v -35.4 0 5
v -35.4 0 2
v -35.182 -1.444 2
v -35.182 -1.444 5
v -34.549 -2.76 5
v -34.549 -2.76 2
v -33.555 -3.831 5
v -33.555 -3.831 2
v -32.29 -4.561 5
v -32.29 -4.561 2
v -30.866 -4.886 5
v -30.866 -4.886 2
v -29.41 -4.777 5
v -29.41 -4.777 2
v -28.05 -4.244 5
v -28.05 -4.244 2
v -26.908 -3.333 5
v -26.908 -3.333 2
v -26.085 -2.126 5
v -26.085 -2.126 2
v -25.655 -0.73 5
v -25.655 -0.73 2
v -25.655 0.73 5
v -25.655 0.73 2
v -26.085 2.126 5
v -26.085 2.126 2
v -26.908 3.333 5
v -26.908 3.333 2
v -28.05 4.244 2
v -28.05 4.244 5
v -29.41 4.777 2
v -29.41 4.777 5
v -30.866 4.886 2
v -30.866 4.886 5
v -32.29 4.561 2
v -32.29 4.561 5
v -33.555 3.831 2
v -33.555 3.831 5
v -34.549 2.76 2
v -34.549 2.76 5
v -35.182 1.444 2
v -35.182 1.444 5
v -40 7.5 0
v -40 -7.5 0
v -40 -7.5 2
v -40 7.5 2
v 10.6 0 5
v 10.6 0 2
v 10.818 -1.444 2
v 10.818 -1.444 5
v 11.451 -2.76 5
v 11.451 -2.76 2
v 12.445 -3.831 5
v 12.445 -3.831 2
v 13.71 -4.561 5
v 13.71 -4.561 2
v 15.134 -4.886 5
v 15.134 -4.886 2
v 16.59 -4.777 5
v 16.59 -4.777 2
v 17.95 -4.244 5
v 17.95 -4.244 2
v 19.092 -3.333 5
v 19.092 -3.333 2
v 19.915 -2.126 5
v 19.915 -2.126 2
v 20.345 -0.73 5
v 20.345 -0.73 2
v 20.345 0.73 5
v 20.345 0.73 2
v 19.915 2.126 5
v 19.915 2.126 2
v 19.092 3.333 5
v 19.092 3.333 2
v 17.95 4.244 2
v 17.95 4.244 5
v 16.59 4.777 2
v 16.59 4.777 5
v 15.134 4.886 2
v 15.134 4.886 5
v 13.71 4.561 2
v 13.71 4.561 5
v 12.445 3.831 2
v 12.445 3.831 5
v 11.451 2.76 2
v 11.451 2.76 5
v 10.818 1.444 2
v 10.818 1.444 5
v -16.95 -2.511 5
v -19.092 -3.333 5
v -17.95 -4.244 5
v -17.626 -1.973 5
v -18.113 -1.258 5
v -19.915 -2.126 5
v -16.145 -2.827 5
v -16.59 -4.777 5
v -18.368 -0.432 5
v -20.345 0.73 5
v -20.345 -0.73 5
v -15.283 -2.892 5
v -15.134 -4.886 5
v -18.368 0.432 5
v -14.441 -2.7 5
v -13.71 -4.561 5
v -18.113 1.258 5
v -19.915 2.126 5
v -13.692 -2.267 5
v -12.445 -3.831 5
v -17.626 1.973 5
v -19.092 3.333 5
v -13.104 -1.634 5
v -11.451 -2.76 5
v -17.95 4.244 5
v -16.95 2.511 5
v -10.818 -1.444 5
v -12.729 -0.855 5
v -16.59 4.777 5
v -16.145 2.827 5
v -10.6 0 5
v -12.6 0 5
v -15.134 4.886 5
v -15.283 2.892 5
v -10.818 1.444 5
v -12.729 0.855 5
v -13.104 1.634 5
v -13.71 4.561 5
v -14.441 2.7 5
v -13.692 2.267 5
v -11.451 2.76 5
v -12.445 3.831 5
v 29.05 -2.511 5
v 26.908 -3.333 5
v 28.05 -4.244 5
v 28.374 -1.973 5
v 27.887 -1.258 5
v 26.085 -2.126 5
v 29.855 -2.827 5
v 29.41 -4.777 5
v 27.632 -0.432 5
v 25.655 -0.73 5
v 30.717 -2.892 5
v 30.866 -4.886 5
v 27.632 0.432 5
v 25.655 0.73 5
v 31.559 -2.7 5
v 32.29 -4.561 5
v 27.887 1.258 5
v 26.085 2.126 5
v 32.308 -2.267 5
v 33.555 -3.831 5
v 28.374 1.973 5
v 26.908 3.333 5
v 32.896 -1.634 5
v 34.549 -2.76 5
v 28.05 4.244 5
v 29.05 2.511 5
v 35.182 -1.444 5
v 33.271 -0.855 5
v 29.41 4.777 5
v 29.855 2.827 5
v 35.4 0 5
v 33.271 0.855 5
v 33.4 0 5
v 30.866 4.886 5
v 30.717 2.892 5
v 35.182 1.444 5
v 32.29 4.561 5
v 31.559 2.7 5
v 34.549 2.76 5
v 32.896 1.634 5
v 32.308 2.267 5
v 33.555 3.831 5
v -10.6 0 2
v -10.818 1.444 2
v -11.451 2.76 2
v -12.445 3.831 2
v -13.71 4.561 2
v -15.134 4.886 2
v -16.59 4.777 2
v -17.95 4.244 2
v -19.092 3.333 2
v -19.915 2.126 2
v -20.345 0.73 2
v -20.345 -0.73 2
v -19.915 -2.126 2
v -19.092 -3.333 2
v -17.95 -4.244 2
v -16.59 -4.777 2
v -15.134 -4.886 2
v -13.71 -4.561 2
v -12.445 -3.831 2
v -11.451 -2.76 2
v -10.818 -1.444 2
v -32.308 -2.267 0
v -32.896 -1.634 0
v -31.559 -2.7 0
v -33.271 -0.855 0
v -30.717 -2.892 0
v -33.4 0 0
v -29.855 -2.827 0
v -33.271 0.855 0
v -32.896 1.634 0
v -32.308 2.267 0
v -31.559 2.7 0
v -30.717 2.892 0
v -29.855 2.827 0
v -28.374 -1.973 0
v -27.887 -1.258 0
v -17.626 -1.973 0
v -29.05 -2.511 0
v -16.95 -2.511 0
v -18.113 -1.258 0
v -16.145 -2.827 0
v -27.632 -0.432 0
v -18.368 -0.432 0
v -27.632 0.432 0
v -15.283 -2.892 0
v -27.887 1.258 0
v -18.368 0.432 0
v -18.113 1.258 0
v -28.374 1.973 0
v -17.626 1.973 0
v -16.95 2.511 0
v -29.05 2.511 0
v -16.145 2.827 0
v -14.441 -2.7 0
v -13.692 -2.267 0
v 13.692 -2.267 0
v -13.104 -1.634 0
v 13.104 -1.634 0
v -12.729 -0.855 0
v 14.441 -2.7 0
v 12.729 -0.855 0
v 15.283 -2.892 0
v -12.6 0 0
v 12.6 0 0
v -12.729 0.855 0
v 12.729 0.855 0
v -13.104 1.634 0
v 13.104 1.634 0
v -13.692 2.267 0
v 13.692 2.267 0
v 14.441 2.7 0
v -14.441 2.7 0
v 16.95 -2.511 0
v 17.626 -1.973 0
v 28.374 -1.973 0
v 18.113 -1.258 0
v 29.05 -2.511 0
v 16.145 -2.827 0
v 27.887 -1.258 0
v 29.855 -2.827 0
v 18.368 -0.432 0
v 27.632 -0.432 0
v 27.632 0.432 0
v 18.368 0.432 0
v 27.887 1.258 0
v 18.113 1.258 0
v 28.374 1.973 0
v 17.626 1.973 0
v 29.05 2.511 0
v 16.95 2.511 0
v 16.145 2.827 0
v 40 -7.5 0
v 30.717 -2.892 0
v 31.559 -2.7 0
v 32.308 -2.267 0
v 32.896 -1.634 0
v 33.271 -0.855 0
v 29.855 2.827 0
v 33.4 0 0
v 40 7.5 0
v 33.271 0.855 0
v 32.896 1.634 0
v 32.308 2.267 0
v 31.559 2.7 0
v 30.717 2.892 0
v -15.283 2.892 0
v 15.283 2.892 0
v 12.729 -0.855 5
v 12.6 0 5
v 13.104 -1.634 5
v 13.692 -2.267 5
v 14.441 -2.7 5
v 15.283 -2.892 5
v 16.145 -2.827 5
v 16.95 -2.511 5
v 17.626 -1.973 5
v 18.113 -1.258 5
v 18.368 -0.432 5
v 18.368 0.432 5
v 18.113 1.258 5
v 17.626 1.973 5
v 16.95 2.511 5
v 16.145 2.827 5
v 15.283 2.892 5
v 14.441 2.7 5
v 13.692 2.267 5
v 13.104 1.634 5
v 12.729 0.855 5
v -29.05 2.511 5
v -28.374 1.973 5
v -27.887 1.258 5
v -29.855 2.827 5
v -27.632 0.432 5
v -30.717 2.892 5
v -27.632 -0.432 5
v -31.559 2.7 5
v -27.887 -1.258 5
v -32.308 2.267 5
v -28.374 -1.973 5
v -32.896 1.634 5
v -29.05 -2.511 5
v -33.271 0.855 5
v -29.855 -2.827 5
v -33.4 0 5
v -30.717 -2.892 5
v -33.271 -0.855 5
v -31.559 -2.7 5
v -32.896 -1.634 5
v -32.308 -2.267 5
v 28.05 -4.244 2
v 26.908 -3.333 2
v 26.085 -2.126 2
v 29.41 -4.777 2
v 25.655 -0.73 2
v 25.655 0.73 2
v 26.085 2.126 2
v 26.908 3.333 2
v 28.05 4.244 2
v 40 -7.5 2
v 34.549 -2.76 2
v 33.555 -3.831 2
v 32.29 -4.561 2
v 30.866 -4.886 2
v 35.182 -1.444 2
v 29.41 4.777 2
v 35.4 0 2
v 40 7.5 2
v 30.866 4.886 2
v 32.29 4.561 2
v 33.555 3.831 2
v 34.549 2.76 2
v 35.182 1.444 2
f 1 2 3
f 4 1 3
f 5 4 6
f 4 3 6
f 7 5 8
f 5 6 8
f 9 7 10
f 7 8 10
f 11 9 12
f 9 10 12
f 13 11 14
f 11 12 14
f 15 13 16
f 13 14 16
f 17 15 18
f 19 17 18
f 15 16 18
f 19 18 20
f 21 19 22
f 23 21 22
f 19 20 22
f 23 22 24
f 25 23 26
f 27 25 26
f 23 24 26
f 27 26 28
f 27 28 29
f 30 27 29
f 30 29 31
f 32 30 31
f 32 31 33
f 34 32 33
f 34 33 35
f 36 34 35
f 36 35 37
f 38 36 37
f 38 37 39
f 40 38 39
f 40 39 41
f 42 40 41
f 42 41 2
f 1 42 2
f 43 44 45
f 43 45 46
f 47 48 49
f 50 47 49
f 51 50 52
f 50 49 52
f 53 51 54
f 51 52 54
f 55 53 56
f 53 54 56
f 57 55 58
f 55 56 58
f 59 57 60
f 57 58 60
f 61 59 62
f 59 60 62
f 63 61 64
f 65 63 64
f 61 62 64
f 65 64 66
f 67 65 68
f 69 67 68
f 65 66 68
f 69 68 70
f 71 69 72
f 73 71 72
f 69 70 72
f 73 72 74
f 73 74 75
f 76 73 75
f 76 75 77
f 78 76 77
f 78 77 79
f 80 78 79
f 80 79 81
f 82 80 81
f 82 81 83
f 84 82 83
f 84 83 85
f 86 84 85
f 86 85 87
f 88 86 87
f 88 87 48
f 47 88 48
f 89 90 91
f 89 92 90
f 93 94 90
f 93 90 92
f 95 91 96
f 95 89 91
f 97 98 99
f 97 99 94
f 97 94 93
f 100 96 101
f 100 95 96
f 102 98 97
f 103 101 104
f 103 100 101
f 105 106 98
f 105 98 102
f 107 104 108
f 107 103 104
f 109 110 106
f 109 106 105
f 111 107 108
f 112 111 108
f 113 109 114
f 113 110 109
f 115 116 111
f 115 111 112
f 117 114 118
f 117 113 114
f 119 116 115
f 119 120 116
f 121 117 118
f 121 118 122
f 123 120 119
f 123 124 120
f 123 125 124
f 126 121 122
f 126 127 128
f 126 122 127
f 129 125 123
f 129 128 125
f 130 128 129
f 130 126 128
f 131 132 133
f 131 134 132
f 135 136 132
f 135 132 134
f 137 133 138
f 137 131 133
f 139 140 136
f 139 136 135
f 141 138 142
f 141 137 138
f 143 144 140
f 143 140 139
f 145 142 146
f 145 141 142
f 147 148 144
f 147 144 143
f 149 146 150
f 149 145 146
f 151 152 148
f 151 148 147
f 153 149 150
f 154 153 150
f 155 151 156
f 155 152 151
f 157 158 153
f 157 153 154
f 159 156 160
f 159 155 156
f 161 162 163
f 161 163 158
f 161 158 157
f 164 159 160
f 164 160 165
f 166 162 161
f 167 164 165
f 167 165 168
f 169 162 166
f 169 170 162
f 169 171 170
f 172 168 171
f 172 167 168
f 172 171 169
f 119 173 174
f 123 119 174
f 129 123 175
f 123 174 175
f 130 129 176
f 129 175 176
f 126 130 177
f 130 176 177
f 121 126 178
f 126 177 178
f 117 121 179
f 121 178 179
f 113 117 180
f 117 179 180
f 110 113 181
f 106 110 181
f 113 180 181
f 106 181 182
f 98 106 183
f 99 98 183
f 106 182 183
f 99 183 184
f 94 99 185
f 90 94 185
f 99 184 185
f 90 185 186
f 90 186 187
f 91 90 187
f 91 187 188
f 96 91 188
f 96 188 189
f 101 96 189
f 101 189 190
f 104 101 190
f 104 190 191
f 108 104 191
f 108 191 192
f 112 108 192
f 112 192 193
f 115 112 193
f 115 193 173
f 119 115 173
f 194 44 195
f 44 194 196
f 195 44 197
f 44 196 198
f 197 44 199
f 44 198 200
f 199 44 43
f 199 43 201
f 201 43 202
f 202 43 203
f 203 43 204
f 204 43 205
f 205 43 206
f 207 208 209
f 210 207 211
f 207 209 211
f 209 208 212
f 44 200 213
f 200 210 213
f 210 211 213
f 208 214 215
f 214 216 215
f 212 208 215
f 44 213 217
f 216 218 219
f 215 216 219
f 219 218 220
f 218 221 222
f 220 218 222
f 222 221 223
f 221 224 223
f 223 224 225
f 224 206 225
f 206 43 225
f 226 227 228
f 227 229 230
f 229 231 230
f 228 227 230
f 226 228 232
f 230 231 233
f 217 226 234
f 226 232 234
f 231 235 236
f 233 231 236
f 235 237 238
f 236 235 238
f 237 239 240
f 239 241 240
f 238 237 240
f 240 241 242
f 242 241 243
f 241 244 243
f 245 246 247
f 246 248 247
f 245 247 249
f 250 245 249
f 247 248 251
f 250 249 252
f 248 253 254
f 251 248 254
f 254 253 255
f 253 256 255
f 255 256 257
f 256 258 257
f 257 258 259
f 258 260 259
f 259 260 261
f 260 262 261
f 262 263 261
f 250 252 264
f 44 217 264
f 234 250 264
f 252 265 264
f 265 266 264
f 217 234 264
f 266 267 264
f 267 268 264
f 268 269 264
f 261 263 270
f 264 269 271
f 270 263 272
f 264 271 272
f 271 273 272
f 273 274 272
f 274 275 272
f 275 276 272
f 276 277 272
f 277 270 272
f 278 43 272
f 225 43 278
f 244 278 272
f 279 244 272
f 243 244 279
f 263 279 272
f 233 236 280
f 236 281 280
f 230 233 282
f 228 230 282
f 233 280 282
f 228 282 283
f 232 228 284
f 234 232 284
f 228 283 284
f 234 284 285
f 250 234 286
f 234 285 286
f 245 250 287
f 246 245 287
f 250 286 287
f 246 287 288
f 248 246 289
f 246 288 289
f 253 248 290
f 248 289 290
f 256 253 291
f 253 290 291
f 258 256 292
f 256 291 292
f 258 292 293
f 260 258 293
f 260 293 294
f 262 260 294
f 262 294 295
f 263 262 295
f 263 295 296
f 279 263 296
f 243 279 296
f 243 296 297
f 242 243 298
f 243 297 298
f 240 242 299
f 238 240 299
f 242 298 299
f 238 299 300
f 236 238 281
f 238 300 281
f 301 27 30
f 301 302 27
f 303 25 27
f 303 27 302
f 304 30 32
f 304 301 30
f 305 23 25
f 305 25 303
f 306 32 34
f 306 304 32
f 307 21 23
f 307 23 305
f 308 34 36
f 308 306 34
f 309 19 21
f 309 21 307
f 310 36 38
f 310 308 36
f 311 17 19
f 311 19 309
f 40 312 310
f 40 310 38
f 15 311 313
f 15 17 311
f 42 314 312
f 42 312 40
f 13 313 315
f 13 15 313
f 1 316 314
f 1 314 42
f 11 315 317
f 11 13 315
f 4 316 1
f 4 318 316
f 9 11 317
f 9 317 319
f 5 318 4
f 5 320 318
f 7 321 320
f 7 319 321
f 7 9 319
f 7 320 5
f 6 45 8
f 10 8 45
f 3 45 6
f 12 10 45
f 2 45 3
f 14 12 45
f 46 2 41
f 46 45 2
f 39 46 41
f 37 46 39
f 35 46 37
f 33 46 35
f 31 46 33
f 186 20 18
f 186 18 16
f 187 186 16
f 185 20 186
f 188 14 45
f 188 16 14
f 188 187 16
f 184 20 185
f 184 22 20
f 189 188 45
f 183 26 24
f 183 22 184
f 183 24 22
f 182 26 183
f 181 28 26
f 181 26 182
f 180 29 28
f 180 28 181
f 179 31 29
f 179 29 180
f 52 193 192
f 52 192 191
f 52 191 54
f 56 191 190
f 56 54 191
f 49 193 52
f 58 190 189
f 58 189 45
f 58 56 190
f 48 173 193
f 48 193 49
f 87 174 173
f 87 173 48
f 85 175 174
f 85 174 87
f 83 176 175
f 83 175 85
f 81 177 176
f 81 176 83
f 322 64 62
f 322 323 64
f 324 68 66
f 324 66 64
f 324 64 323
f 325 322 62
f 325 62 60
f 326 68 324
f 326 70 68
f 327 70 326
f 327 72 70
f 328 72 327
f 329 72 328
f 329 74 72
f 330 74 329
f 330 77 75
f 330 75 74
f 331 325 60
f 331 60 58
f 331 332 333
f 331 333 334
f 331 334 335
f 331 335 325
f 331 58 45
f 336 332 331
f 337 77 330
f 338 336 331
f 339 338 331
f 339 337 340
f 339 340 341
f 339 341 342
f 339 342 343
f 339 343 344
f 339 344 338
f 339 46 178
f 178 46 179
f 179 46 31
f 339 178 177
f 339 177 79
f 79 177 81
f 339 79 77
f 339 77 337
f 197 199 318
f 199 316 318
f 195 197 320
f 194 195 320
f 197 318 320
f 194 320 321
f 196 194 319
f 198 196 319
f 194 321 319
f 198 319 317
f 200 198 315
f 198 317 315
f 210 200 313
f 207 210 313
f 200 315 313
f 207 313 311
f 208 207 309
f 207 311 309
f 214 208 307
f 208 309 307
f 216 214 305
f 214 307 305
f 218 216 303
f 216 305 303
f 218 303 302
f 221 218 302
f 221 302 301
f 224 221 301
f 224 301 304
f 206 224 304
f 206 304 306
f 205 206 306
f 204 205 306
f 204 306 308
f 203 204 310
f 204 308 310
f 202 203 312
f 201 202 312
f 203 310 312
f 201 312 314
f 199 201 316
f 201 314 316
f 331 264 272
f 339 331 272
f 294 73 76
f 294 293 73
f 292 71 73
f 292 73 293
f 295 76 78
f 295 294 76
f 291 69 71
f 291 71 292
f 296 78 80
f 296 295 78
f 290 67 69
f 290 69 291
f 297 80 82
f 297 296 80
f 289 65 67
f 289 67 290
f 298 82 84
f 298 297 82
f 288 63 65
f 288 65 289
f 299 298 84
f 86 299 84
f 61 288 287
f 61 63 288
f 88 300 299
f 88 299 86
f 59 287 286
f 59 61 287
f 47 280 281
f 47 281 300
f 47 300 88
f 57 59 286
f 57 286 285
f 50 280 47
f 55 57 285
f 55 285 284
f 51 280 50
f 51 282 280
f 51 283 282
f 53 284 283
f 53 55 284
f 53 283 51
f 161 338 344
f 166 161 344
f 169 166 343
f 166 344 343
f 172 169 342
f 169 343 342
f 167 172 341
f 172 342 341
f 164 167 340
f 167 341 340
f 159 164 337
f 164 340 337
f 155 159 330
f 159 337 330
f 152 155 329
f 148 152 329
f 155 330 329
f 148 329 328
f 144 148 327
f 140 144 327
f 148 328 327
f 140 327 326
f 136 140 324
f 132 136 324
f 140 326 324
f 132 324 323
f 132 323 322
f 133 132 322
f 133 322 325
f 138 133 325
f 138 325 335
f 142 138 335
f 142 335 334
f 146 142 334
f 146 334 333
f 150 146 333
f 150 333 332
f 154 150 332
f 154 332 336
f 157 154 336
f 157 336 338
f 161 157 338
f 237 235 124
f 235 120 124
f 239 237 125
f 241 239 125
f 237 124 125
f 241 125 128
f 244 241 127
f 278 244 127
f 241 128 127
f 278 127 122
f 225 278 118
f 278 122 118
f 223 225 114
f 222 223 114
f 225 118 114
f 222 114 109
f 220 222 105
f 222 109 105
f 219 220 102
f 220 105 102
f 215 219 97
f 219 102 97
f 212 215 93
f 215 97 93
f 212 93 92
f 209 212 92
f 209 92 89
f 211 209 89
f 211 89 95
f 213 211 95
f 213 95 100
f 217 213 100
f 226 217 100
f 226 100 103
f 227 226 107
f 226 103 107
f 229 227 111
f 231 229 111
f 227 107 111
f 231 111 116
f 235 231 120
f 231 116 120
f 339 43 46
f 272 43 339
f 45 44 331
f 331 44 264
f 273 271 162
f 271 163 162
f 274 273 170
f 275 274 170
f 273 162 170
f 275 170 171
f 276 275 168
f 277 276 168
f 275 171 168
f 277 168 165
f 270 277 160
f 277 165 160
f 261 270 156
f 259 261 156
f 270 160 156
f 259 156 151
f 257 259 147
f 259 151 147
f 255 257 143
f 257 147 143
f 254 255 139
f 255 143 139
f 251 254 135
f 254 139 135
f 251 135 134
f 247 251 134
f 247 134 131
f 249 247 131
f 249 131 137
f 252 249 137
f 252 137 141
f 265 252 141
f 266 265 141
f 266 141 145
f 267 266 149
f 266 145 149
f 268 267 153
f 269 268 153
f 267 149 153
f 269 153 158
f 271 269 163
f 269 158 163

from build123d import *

# Parameters (mm, degrees)
SKETCH1_R             = 4.9
SKETCH1_R_2           = 2.9
BOSS_EXTRUDE1_DEPTH   = 5
BOSS_EXTRUDE1_2_DEPTH = 5
BOSS_EXTRUDE1_3_DEPTH = 5
BOSS_EXTRUDE1_4_DEPTH = 5
SKETCH3_W             = 80
SKETCH3_H             = 15
BOSS_EXTRUDE2_DEPTH   = 2
SKETCH4_R             = 2.9
CUT_EXTRUDE1_DEPTH    = 42.003048667


with BuildPart() as part:
    # Sketch1 → Boss-Extrude1 (new body)
    with BuildSketch(Plane.XY):
        with Locations((-15.5, 0)):
            Circle(SKETCH1_R)
        with Locations((-15.5, 0)):
            Circle(SKETCH1_R_2, mode=Mode.SUBTRACT)
    extrude(amount=BOSS_EXTRUDE1_DEPTH)



with BuildPart() as body_2:
    # Sketch1 → Boss-Extrude1 2 (new body)
    with BuildSketch(Plane.XY):
        with Locations(Location((-30.5, 0, 0), (0, 0, 180))):
            Circle(SKETCH1_R)
        with Locations(Location((-30.5, 0, 0), (0, 0, 180))):
            Circle(SKETCH1_R_2, mode=Mode.SUBTRACT)
    extrude(amount=BOSS_EXTRUDE1_2_DEPTH)


with BuildPart() as body_3:
    # Sketch1 → Boss-Extrude1 3 (new body)
    with BuildSketch(Plane.XY):
        with Locations(Location((15.5, 0, 0), (0, 0, 180))):
            Circle(SKETCH1_R)
        with Locations(Location((15.5, 0, 0), (0, 0, 180))):
            Circle(SKETCH1_R_2, mode=Mode.SUBTRACT)
    extrude(amount=BOSS_EXTRUDE1_3_DEPTH)


with BuildPart() as body_4:
    # Sketch1 → Boss-Extrude1 4 (new body)
    with BuildSketch(Plane.XY):
        with Locations((30.5, 0)):
            Circle(SKETCH1_R)
        with Locations((30.5, 0)):
            Circle(SKETCH1_R_2, mode=Mode.SUBTRACT)
    extrude(amount=BOSS_EXTRUDE1_4_DEPTH)


with BuildPart() as part_1:
    add(part.part)

    add(body_2.part)  # Boss-Extrude2 merges body 2

    add(body_3.part)  # Boss-Extrude2 merges body 3

    add(body_4.part)  # Boss-Extrude2 merges body 4
    # Sketch3 → Boss-Extrude2 (add)
    with BuildSketch(Plane.XY):
        Rectangle(SKETCH3_W, SKETCH3_H)
    extrude(amount=BOSS_EXTRUDE2_DEPTH)

    # Sketch4 → Cut-Extrude1 (cut, through all)
    with BuildSketch(Plane.XY.offset(5)):
        with Locations(Location((-30.5, 0, 0), (0, 0, 180))):
            Circle(SKETCH4_R)
        with Locations((-15.5, 0)):
            Circle(SKETCH4_R)
        with Locations(Location((15.5, 0, 0), (0, 0, 180))):
            Circle(SKETCH4_R)
        with Locations((30.5, 0)):
            Circle(SKETCH4_R)
    extrude(amount=-CUT_EXTRUDE1_DEPTH, mode=Mode.SUBTRACT)


solid = part_1.part
